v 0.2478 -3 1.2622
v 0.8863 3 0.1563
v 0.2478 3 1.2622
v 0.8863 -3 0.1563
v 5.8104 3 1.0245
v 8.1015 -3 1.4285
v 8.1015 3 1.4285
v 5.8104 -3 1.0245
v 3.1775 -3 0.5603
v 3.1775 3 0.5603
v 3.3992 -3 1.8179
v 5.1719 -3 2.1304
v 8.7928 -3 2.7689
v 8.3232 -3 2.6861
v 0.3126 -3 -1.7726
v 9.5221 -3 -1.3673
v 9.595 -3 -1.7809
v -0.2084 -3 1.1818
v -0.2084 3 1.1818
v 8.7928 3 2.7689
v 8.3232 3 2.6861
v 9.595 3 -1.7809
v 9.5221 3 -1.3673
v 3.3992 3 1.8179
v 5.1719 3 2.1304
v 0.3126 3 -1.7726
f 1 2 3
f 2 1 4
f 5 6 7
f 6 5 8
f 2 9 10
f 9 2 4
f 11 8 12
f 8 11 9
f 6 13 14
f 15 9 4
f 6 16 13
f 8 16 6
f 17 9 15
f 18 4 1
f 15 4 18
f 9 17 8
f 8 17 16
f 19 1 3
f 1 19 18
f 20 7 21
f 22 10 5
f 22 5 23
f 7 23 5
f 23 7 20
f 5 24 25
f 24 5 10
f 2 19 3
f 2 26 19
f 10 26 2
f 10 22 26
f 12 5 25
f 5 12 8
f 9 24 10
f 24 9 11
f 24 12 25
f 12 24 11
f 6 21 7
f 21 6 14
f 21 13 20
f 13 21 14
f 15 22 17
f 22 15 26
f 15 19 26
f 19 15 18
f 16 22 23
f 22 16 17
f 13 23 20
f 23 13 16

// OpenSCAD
//rotate([0,10,0])
//import("K8200_GT2_Belt_Wedge.stl");

tooth_angle=40;
tooth_height=1.2;
tooth_top_width=1.8;
pitch=5;
decalage = tan(tooth_angle/2)*tooth_height;

module socle(){
linear_extrude(height=6, center=true, convexity = 0, twist = 0) 
				polygon(points=[
					[0,0],
					[0,-1.8],
					[9.14,-3.42],
                    [9.14,0]
					], paths=[[0,1,2,3]]);
}

module dent(){
    
    linear_extrude(height=6, center=true, convexity = 0, twist = 0) 
				polygon(points=[
					[0,0],
					[decalage,tooth_height],
					[decalage+tooth_top_width,tooth_height],
                    [2*decalage+tooth_top_width,0]
					], paths=[[0,1,2,3]]);
}

module dents(){
    dent();
    translate([pitch,0,0]) dent();
    translate([2*pitch,0,0]) dent();
}

module wedge1(){
	difference(){
		union(){
	    	rotate([90,0,0])
			color("blue")
			socle();
			translate([-(tooth_top_width/2+2*decalage),0,0])
			rotate([90,0,0])
			color("red")
			dents();
    	}
        translate([-3,0,0])
    	cube([6,7,6],center=true);
        translate([9.14+3,0,0])
    	cube([6,7,6],center=true);
	}
}

module wedge2(){
	difference(){
		union(){
	    	rotate([90,0,0])
			color("blue")
			socle();
			translate([2*decalage,0,0])
			rotate([90,0,0])
			color("red")
			dents();
    	}
        translate([-3,0,0])
    	cube([6,7,6],center=true);
        translate([9.14+3,0,0])
    	cube([6,7,6],center=true);
	}
}

rotate([0,-10,0])
wedge1();
